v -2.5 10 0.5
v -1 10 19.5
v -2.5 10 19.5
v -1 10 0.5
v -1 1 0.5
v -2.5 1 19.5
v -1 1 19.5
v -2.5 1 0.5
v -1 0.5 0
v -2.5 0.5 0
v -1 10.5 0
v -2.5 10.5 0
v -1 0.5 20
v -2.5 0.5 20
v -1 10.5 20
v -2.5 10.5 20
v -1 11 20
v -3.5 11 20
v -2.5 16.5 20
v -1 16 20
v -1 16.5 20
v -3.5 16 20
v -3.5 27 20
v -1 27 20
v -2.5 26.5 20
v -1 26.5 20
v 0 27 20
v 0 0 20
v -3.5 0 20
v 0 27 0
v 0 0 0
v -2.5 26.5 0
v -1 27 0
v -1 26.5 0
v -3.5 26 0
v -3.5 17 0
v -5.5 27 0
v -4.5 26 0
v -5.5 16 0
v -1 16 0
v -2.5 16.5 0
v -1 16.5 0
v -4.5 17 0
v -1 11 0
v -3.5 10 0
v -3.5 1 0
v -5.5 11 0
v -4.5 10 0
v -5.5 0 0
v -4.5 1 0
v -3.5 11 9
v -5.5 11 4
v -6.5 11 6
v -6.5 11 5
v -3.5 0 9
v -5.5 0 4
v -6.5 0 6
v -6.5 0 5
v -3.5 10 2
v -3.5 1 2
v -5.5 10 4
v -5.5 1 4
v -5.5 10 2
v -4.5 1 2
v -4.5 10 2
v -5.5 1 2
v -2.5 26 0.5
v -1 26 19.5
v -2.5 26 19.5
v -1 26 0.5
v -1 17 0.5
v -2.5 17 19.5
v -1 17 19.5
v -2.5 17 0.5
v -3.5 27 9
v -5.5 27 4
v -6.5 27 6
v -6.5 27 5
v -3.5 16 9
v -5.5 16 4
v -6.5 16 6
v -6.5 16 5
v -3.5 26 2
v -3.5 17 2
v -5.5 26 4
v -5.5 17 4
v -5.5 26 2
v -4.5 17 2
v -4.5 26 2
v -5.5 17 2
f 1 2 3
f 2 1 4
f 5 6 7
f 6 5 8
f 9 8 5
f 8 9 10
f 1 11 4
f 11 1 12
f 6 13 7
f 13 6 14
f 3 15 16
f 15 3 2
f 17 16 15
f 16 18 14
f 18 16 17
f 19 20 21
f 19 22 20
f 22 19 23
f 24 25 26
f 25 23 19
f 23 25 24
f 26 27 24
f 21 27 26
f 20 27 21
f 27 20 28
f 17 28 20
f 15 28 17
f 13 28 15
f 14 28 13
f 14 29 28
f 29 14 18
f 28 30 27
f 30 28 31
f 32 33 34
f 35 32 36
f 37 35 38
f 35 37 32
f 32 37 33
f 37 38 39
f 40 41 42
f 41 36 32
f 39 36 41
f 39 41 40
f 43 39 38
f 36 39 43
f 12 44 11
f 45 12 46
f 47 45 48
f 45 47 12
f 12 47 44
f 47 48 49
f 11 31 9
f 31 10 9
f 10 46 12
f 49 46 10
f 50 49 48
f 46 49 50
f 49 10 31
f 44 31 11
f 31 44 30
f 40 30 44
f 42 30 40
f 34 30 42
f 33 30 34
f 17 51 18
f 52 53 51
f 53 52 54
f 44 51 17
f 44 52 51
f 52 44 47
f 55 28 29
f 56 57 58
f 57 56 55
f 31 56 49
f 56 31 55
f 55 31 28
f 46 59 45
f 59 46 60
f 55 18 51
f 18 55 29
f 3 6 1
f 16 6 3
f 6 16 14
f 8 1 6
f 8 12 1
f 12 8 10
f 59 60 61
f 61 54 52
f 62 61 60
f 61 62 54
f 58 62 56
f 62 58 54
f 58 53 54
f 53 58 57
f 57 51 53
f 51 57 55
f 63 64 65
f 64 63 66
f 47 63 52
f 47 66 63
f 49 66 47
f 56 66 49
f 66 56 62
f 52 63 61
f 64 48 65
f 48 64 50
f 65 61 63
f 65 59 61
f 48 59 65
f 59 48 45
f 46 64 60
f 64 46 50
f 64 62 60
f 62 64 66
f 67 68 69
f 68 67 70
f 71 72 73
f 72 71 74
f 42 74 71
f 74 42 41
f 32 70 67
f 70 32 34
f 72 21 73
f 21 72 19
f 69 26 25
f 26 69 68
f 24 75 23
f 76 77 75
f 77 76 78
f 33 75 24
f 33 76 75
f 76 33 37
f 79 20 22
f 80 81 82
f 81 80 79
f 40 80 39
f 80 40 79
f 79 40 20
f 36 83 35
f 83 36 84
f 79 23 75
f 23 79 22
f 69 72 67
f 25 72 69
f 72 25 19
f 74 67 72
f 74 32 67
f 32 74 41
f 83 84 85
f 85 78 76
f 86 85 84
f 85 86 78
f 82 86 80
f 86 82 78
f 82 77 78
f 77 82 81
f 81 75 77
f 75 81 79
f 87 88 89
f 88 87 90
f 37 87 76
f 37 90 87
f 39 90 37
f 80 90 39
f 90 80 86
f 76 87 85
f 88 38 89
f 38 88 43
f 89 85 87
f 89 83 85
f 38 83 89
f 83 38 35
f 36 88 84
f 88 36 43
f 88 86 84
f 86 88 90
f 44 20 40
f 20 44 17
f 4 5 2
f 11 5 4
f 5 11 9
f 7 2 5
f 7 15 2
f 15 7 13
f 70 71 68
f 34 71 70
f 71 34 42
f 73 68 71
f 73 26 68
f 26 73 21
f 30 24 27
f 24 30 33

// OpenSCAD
// Manual SMT cut strip feeder array.

// TODO: cleanup.

/* [Hidden] */
eps1 = 0.0001;
eps2 = 2*eps1;

/* [Setting] */

// Number of feeders.
feeders_count = 2;

// Width of the tape slot (tape width + margin).
tape_slot_width = 9;

// Height of the tape slot (tape thickness + margin)
tape_slot_height = 1.5;

// The width of the tight (viewed from front) tape slot support.
tape_support_width_right = 1.5;

// The width of the left (viewed from front) tape slot support.
tape_support_width_left = 2.5;

// Width of the slot below the tape.
part_slot_width = tape_slot_width - tape_support_width_left - tape_support_width_right ;

// Height of the slot below the tape. Set to 0 for none.
part_slot_height = 0;

// Overall length.
total_length = 20;  

// Spacing between feeders.
inter_feeder_space = 5;

/* [Tweaking] */

// Thickness of side walls.
side_wall_width = 1;

// Thickness of the bottom.
bottom_thickness = 1; 

// Thickness of the top.
top_thickness = 1;


// Taper angle at the tape entry and exit ends.
tape_slot_taper_angle = 45;

// Height below the tape peeling bridge.
bridge_gap = 1;

// Width of the tape peeling bridge, viewing from the side.
bridge_width = 2;

// Thickness of the tape peeling bridge top.
bridge_top_thickness = 1;

// Distance of the peeling bridge from the front of the part.
bridge_offset = 0;

// Total bridge height.
bridge_height = bridge_gap + bridge_top_thickness;

// Height of the tape peeling ramp.
ramp_height = 3;

// Horizontal length of the tape peeling ramp.
ramp_length = 3;

// Extra length at the high end of the ramp.
//ramp_tail_length = 3;

// Horizontal space between bridge and ramp.
ramp_offset_from_bridge = 0;

ramp_offset = bridge_offset + bridge_width + ramp_offset_from_bridge;

// Thickness of the plate that connects feeders.
plate_thickness = bottom_thickness;


base_length = total_length;
base_height = bottom_thickness + part_slot_height + tape_slot_height;
base_width = tape_slot_width + 2*side_wall_width;

ramp_width = base_width;

module tape_slot_taper(x, y, a) {
  translate([x, y, 0])
  rotate([0, 0, a])
  translate([-3*side_wall_width/2, 0, 0])  cube([3*side_wall_width, eps1, tape_slot_height+eps2]);
}

module base_body() {
  cube([base_length, base_width, base_height]);
}

module parts_slot() {
 translate([-eps1, side_wall_width + tape_support_width_right, 0]) 
    cube([base_length+eps2, part_slot_width, part_slot_height]);  
}

module tape_slot() {
 a = tape_slot_taper_angle;

 translate([-eps1, (base_width-tape_slot_width)/2, 0]) 
     cube([base_length+eps2, tape_slot_width, tape_slot_height+eps2]);

 hull() {
  tape_slot_taper(0,  side_wall_width/2, a);
  tape_slot_taper(0, base_width - side_wall_width/2, -a);
 }

 hull() {
 tape_slot_taper(total_length, side_wall_width/2, -a);
 tape_slot_taper(total_length, base_width - side_wall_width/2, a);
 }
}


module base_main() {
  difference() {
    base_body();
    translate([0, 0, bottom_thickness]) parts_slot();
    translate([0, 0, bottom_thickness+part_slot_height-eps1]) tape_slot();
  }
}

module top_ramp() {
  translate([0, (base_width-ramp_width)/2, 0]) 
  hull() {
    cube([eps1, ramp_width, eps1]);
    translate([ramp_length, 0, 0])  cube([eps1, ramp_width, ramp_height]);
 translate([ramp_length+1, 0, 0])  cube([eps1, ramp_width, ramp_height]);
    translate([2*ramp_length + 1, 0, 0])  cube([eps1, ramp_width, eps1]);
  }
}

//module top_hole(x, l, w) {
//  translate([x, (base_width-w)/2, -eps1]) cube([l, w, top_thickness + eps2]);
//}

module bridge_main() {
  bridge_height = bridge_gap + bridge_top_thickness;
  side_wall_length = bridge_width + ramp_offset_from_bridge + ramp_length;

  difference() {
    cube([bridge_width, base_width, bridge_height]);
    translate([-eps1, (base_width - tape_slot_width)/2, -eps1]) cube([bridge_width+eps2, tape_slot_width, bridge_gap+eps1]);
  }

  cube([side_wall_length, side_wall_width, bridge_height]); 

  translate([0, base_width - side_wall_width, 0]) cube([side_wall_length, side_wall_width, bridge_height]); 
}

module top_main() {
  difference() {
  cube([base_length, base_width, top_thickness]);
  //top_hole(top_hole_offset, top_hole_length, tape_slot_width);
}
  translate([ramp_offset, 0, top_thickness - eps1]) top_ramp();
}

module one_feeder() {
   base_main();
   translate([0, 0, base_height-eps1]) top_main();
   translate([bridge_offset, 0,  base_height + top_thickness - eps2]) bridge_main();
}

module main() {
  width = feeders_count*base_width + (feeders_count-1)*inter_feeder_space; 
  for ( i = [0 : feeders_count-1] ) {
    translate([0, i*(base_width + inter_feeder_space - eps1), 0]) one_feeder();
  }
  cube([base_length, width, plate_thickness]);
}

// NOTE: rotation around z for better view angle on thingieverse.

//translate([0, 0, base_length]) 
rotate([0, -90, 0]) 
main();
